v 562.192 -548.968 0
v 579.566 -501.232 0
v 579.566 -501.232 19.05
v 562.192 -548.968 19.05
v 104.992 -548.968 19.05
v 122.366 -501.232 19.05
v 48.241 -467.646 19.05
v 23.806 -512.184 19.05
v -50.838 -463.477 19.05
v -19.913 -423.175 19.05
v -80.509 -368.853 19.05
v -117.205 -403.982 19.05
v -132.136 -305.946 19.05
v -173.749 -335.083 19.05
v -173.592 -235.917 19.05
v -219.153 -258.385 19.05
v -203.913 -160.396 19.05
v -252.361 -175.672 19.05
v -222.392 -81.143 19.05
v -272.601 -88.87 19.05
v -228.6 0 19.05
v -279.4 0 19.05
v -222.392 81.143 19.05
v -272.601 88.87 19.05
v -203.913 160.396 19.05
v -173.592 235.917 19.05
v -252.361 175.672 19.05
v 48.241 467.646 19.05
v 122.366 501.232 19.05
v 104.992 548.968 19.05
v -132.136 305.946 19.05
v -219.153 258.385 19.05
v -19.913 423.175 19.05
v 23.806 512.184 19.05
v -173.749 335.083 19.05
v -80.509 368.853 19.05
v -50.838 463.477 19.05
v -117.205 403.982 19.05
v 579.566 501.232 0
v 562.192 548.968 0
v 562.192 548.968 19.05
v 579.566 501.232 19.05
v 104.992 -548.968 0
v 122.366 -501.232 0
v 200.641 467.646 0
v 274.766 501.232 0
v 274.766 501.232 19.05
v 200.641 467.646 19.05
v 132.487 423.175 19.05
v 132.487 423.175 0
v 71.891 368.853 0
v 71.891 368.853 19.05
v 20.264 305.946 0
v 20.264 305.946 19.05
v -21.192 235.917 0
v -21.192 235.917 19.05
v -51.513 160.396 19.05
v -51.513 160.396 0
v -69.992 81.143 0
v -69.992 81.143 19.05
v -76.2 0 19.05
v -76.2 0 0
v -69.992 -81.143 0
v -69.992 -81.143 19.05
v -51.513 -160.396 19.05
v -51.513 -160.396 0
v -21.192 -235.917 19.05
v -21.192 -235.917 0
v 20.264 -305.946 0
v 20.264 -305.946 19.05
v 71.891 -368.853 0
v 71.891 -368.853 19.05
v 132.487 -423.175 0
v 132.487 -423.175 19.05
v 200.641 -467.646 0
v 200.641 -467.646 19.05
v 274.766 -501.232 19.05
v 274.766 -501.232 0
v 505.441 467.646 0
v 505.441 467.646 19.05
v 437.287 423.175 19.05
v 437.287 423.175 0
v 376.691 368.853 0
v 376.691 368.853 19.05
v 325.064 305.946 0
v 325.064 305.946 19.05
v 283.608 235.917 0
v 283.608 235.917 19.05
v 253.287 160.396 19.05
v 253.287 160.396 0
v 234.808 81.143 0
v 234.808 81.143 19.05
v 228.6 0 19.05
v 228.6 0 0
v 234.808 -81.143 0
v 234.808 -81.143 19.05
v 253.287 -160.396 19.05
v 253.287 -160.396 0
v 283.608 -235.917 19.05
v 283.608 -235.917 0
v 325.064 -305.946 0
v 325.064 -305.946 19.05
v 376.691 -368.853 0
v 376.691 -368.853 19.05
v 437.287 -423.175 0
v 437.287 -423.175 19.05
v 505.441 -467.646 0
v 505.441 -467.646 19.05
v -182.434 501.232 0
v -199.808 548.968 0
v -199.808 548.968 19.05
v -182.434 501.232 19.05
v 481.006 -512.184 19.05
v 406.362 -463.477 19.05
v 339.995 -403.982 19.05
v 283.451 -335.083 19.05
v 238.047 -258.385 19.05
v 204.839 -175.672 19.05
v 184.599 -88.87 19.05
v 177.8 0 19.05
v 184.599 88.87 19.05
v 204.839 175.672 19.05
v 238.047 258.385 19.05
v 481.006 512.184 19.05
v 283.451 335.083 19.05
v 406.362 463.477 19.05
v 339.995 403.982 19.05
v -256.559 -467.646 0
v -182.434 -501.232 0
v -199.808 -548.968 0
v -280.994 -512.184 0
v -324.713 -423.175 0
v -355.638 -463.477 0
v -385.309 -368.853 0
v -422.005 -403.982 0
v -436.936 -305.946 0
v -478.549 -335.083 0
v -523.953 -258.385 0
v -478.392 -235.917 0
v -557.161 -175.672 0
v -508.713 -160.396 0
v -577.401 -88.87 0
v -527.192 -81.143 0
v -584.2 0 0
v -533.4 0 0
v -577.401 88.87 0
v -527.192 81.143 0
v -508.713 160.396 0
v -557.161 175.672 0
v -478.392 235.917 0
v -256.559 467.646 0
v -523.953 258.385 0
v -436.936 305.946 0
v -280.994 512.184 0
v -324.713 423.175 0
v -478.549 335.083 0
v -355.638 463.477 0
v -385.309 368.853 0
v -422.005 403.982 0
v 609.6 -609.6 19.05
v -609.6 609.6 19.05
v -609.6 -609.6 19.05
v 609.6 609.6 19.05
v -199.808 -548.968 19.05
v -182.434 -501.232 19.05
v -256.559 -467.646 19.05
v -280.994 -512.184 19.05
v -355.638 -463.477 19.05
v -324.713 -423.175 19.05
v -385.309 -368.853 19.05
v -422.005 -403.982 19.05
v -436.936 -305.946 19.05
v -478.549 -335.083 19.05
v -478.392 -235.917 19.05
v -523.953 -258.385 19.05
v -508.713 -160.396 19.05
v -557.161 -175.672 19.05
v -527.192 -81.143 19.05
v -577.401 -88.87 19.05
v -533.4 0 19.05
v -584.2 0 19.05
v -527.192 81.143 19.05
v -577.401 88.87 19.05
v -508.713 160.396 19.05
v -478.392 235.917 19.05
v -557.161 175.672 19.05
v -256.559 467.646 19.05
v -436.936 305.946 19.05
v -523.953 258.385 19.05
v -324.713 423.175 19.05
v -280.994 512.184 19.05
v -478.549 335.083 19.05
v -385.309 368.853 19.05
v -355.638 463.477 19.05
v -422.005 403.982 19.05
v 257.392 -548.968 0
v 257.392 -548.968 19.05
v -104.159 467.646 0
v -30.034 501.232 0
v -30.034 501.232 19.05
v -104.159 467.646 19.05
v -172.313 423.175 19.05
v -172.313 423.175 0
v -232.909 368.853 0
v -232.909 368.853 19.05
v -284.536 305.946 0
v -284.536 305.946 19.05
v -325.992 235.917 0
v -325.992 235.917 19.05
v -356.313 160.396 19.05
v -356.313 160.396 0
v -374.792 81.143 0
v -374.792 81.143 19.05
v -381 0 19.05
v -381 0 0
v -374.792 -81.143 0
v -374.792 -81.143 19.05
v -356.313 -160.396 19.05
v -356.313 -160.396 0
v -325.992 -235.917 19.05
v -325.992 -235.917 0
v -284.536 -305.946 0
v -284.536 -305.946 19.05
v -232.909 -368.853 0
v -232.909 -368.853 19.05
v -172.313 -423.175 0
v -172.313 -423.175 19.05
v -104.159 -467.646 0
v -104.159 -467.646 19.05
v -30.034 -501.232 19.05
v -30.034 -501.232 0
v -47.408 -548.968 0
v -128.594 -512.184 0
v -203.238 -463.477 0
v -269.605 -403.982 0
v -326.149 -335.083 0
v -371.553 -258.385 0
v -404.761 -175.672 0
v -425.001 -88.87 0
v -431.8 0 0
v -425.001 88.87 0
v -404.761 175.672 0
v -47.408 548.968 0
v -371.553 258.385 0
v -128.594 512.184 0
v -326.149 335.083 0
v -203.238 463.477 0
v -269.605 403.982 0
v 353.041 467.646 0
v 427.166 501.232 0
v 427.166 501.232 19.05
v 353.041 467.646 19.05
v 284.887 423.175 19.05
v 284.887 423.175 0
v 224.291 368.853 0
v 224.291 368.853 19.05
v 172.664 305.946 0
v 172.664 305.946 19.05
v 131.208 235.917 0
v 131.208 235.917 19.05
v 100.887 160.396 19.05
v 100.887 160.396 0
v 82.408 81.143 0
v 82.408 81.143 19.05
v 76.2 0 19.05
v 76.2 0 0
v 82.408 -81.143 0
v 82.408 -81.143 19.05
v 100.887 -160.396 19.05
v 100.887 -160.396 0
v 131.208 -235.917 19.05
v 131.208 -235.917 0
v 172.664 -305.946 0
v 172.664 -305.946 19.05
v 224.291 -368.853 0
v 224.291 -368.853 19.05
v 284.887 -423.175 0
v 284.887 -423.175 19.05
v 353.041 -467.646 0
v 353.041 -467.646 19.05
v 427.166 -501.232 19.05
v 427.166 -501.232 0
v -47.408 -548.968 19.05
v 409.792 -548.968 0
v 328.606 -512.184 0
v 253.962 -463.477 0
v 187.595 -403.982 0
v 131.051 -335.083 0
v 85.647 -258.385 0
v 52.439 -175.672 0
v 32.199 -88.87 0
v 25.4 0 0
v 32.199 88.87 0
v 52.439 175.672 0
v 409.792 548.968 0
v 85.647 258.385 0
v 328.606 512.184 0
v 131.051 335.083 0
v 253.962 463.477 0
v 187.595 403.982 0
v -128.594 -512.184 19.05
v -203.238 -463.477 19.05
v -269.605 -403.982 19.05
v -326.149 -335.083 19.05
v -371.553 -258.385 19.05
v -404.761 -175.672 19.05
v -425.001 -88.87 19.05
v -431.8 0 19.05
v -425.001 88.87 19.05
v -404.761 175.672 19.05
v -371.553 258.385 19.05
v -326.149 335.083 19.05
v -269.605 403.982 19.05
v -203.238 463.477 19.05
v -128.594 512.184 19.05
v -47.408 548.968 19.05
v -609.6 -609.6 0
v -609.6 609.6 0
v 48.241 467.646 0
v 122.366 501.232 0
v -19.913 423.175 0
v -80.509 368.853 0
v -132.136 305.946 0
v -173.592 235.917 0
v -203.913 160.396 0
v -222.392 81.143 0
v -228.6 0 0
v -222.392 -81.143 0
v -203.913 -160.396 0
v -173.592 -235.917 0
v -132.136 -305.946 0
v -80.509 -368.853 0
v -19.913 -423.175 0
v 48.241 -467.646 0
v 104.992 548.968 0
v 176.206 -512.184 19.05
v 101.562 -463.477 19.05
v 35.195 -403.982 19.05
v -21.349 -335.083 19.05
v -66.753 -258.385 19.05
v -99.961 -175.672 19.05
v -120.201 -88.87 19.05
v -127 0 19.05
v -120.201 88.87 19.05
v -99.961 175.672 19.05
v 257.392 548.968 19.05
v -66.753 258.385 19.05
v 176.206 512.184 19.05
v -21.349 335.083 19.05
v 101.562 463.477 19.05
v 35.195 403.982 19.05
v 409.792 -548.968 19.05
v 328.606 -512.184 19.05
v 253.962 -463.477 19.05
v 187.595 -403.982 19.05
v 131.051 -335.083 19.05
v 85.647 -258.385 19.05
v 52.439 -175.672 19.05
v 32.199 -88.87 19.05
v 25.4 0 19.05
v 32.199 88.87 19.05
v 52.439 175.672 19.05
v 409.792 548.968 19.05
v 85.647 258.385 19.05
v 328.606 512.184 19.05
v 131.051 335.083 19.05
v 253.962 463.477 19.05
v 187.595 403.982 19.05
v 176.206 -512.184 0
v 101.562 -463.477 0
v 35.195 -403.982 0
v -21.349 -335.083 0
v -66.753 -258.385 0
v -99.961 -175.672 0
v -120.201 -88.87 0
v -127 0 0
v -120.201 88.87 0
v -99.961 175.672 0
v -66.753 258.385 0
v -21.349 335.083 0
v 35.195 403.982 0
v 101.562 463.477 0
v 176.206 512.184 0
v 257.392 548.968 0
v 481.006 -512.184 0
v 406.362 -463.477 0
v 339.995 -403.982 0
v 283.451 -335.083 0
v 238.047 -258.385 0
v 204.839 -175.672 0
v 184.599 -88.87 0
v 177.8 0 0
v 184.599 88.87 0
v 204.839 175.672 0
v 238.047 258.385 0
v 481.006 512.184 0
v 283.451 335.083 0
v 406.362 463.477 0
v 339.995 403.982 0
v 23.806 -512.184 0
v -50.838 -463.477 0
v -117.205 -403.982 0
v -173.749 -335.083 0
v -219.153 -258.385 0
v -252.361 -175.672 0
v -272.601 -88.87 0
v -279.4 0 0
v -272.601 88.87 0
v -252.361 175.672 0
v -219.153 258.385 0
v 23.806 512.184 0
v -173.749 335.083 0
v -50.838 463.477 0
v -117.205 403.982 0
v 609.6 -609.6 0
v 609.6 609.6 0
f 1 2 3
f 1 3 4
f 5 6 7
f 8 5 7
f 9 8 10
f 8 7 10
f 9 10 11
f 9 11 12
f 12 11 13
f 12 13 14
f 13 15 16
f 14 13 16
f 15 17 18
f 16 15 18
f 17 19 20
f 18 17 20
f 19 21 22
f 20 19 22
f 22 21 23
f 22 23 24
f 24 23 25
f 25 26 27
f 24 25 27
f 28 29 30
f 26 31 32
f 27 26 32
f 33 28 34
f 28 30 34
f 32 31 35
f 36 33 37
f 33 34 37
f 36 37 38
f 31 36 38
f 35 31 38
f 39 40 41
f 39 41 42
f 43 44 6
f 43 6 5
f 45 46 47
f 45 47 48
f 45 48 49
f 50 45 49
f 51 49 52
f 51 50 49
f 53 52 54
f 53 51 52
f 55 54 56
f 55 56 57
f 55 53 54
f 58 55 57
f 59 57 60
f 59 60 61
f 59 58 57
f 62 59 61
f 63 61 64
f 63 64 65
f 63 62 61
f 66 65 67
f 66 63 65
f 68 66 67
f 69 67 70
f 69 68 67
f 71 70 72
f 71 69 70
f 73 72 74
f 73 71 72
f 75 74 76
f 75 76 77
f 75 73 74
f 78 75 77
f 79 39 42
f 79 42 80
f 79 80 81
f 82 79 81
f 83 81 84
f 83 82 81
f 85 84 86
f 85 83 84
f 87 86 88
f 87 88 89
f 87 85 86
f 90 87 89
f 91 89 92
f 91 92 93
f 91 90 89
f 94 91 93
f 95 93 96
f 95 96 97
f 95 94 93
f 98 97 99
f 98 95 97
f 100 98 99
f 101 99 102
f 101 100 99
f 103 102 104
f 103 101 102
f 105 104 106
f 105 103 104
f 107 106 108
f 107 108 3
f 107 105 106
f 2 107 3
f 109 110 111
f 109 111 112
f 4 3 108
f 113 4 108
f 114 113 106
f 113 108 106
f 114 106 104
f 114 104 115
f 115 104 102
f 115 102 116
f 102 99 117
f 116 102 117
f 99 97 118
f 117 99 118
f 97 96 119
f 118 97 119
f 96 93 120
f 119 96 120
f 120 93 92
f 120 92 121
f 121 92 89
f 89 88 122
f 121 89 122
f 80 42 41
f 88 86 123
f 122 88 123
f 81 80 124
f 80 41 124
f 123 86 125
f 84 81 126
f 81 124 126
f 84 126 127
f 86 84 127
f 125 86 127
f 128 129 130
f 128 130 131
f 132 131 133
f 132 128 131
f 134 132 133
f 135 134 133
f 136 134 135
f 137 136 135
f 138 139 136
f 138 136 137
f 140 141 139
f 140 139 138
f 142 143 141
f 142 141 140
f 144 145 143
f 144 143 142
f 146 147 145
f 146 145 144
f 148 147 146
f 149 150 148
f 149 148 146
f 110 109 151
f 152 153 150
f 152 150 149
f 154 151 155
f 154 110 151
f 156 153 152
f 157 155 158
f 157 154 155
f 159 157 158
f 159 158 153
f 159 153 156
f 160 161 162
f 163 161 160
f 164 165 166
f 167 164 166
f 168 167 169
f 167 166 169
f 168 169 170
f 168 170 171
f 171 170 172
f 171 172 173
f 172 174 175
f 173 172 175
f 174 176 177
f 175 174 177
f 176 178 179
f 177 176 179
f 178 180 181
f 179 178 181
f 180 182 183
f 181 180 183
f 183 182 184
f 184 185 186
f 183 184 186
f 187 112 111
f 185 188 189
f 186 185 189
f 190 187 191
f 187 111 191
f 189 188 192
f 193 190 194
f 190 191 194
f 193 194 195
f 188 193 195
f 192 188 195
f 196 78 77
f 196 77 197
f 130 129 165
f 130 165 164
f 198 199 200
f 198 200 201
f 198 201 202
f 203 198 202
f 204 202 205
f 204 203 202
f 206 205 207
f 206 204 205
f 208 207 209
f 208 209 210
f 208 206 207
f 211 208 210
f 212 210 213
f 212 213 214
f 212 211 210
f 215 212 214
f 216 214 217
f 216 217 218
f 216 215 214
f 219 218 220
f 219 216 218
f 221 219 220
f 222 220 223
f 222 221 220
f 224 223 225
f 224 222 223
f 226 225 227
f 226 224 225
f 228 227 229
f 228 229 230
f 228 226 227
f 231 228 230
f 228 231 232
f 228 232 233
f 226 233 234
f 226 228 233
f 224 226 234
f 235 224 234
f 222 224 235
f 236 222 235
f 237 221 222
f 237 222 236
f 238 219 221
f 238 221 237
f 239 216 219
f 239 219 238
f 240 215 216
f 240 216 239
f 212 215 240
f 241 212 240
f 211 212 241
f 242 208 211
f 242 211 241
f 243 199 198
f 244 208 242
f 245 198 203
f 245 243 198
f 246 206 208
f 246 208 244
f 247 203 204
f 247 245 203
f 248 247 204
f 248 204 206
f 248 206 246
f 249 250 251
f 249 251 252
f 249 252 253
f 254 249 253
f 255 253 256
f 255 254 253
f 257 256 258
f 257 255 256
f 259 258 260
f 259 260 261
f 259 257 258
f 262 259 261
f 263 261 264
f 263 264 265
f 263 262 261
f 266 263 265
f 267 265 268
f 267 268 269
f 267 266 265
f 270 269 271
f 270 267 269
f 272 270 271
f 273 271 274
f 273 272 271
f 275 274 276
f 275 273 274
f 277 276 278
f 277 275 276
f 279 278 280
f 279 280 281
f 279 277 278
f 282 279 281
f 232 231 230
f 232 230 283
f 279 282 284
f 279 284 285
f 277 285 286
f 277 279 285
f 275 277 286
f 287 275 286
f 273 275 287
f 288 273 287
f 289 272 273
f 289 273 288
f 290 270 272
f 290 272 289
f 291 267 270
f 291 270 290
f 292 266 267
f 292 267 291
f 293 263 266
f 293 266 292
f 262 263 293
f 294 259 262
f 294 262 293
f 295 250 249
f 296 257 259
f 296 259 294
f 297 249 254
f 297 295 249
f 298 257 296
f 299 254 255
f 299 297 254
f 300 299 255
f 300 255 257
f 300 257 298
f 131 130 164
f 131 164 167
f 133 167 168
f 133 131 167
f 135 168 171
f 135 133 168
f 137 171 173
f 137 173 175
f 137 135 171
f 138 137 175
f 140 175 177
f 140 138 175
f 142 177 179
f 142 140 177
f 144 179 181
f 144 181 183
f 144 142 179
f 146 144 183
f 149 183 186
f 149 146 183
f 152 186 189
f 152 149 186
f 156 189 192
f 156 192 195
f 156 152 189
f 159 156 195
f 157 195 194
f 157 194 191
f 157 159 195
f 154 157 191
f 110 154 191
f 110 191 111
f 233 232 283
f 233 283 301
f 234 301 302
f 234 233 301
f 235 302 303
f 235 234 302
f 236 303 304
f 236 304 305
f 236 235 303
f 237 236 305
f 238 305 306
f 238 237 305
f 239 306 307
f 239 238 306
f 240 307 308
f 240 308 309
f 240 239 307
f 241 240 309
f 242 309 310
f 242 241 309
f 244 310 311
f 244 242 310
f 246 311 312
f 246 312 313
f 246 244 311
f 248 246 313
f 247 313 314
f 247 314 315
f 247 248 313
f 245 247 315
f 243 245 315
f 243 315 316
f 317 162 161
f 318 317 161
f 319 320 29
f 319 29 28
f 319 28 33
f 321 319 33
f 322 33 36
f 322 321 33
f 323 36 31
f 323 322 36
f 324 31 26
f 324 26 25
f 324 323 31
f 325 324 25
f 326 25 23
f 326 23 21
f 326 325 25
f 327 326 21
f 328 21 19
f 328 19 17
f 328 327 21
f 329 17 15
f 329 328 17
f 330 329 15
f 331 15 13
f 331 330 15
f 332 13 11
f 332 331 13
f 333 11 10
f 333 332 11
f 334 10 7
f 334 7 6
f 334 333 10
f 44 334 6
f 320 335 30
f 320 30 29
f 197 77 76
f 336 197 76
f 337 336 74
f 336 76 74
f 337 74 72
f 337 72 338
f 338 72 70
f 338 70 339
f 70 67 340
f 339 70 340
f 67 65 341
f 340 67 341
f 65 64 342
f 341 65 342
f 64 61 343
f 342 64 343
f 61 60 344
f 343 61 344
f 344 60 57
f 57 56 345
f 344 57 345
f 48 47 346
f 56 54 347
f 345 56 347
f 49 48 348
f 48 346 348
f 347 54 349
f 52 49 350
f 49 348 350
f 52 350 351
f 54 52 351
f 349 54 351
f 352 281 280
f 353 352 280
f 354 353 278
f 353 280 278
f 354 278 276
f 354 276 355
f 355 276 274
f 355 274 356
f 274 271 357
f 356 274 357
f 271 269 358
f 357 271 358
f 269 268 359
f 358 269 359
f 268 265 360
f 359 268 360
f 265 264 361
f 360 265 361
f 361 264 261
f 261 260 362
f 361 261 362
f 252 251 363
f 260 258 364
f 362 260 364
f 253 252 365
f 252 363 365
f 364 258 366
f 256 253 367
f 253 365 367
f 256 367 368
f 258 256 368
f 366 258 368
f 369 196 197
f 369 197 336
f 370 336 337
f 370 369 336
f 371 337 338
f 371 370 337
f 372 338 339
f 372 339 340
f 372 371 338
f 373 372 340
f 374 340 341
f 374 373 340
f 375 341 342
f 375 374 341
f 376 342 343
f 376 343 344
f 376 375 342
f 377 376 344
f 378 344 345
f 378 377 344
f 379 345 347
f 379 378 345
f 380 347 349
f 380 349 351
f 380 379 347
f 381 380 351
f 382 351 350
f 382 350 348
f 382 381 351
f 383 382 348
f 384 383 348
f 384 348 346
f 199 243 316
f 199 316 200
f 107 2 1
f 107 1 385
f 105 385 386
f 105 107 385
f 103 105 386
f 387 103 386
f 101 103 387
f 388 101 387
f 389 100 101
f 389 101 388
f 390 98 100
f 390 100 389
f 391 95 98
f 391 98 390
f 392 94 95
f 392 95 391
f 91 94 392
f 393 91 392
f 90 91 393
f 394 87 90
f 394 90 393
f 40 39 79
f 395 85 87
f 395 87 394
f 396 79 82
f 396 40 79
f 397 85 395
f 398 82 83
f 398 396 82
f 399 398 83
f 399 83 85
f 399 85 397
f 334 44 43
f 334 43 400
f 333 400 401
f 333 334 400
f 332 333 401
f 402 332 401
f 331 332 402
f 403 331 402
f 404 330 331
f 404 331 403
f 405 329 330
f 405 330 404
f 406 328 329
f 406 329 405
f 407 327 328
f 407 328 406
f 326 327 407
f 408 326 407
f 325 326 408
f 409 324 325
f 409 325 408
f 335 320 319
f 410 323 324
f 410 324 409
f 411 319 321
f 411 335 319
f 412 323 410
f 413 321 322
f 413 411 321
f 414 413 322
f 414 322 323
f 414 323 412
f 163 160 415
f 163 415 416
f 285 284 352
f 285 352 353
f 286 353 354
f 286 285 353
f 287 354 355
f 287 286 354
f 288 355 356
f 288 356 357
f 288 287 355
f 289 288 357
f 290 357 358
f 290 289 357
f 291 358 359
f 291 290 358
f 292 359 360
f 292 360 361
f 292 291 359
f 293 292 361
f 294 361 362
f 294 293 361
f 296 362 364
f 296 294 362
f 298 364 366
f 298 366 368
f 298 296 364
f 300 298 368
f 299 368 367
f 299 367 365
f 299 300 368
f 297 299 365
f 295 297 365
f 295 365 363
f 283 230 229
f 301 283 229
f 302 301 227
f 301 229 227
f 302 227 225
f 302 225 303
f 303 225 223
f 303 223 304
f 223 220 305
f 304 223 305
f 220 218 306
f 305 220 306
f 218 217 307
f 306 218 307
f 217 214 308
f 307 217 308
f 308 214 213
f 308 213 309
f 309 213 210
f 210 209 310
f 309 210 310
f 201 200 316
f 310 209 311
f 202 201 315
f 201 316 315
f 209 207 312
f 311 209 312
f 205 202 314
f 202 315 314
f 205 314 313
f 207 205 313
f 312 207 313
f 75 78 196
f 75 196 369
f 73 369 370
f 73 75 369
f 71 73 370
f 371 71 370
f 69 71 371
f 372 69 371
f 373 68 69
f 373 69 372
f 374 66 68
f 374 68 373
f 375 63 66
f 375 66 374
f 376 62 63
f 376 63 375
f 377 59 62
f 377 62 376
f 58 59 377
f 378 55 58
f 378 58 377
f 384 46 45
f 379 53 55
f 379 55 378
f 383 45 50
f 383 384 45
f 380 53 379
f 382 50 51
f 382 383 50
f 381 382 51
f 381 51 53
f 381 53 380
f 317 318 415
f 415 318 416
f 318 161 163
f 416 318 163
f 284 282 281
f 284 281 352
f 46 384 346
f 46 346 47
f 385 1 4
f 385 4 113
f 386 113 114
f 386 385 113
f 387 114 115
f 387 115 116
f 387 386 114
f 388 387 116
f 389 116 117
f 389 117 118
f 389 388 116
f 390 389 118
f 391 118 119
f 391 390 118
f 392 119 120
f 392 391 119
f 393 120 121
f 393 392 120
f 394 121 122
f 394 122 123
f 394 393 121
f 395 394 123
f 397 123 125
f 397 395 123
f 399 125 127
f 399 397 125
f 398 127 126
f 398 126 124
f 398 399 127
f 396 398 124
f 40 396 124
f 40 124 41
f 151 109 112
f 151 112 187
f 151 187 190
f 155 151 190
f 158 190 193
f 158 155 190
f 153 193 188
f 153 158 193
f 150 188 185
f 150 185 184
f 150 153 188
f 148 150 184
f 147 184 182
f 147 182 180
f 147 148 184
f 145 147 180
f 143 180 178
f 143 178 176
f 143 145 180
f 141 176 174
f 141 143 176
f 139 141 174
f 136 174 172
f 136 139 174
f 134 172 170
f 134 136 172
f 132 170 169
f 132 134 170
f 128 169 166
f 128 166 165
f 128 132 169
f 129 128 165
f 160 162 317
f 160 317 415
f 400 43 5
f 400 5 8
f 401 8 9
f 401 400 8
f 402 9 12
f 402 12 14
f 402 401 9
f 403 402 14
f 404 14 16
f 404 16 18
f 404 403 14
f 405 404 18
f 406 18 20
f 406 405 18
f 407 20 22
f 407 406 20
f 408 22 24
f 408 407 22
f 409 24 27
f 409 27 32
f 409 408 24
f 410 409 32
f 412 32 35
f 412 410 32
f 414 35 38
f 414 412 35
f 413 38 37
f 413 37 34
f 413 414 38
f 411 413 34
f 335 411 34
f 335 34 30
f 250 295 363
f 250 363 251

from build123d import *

# Parameters (mm, degrees)
BOSS_EXTRUDE1_DEPTH   = 19.05
BOSS_EXTRUDE1_2_DEPTH = 19.05
BOSS_EXTRUDE1_3_DEPTH = 19.05
BOSS_EXTRUDE1_4_DEPTH = 19.05
BOSS_EXTRUDE1_5_DEPTH = 19.05
BOSS_EXTRUDE1_6_DEPTH = 19.05
SKETCH2_W             = 1219.2
SKETCH2_H             = 1219.2
STOCK_DEPTH           = 19.05


with BuildPart() as part:
    # Sketch1 → Boss-Extrude1 (new body)
    with BuildSketch(Plane.XY):
        with BuildLine():
            Line((-199.808167731, 548.968429063), (-182.43354445, 501.232043927))
            ThreePointArc((-182.43354445, 501.232043927), (-533.4, 0), (-182.43354445, -501.232043927))
            Line((-182.43354445, -501.232043927), (-199.808167731, -548.968429063))
            ThreePointArc((-199.808167731, -548.968429063), (-584.2, 0), (-199.808167731, 548.968429063))
        make_face()
    extrude(amount=BOSS_EXTRUDE1_DEPTH)


with BuildPart() as body_2:
    # Sketch1 → Boss-Extrude1 2 (new body)
    with BuildSketch(Plane.XY):
        with BuildLine():
            Line((-47.408167731, 548.968429063), (-30.03354445, 501.232043927))
            ThreePointArc((-30.03354445, 501.232043927), (-381, 0), (-30.03354445, -501.232043927))
            Line((-30.03354445, -501.232043927), (-47.408167731, -548.968429063))
            ThreePointArc((-47.408167731, -548.968429063), (-431.8, 0), (-47.408167731, 548.968429063))
        make_face()
    extrude(amount=BOSS_EXTRUDE1_2_DEPTH)


with BuildPart() as body_3:
    # Sketch1 → Boss-Extrude1 3 (new body)
    with BuildSketch(Plane.XY):
        with BuildLine():
            Line((104.991832269, 548.968429063), (122.36645555, 501.232043927))
            ThreePointArc((122.36645555, 501.232043927), (-228.6, 0), (122.36645555, -501.232043927))
            Line((122.36645555, -501.232043927), (104.991832269, -548.968429063))
            ThreePointArc((104.991832269, -548.968429063), (-279.4, 0), (104.991832269, 548.968429063))
        make_face()
    extrude(amount=BOSS_EXTRUDE1_3_DEPTH)


with BuildPart() as body_4:
    # Sketch1 → Boss-Extrude1 4 (new body)
    with BuildSketch(Plane.XY):
        with BuildLine():
            Line((257.391832269, 548.968429063), (274.76645555, 501.232043927))
            ThreePointArc((274.76645555, 501.232043927), (-76.2, 0), (274.76645555, -501.232043927))
            Line((274.76645555, -501.232043927), (257.391832269, -548.968429063))
            ThreePointArc((257.391832269, -548.968429063), (-127, 0), (257.391832269, 548.968429063))
        make_face()
    extrude(amount=BOSS_EXTRUDE1_4_DEPTH)


with BuildPart() as body_5:
    # Sketch1 → Boss-Extrude1 5 (new body)
    with BuildSketch(Plane.XY):
        with BuildLine():
            Line((409.791832269, 548.968429063), (427.16645555, 501.232043927))
            ThreePointArc((427.16645555, 501.232043927), (76.2, 0), (427.16645555, -501.232043927))
            Line((427.16645555, -501.232043927), (409.791832269, -548.968429063))
            ThreePointArc((409.791832269, -548.968429063), (25.4, 0), (409.791832269, 548.968429063))
        make_face()
    extrude(amount=BOSS_EXTRUDE1_5_DEPTH)


with BuildPart() as body_6:
    # Sketch1 → Boss-Extrude1 6 (new body)
    with BuildSketch(Plane.XY):
        with BuildLine():
            Line((562.191832269, 548.968429063), (579.56645555, 501.232043927))
            ThreePointArc((579.56645555, 501.232043927), (228.6, 0), (579.56645555, -501.232043927))
            Line((579.56645555, -501.232043927), (562.191832269, -548.968429063))
            ThreePointArc((562.191832269, -548.968429063), (177.8, 0), (562.191832269, 548.968429063))
        make_face()
    extrude(amount=BOSS_EXTRUDE1_6_DEPTH)


with BuildPart() as body_7:
    # Sketch2 → Stock (new body)
    with BuildSketch(Plane.XY.offset(19.05)):
        Rectangle(SKETCH2_W, SKETCH2_H)
    extrude(amount=-STOCK_DEPTH)


solid = Compound([part.part, body_2.part, body_3.part, body_4.part, body_5.part, body_6.part, body_7.part])
